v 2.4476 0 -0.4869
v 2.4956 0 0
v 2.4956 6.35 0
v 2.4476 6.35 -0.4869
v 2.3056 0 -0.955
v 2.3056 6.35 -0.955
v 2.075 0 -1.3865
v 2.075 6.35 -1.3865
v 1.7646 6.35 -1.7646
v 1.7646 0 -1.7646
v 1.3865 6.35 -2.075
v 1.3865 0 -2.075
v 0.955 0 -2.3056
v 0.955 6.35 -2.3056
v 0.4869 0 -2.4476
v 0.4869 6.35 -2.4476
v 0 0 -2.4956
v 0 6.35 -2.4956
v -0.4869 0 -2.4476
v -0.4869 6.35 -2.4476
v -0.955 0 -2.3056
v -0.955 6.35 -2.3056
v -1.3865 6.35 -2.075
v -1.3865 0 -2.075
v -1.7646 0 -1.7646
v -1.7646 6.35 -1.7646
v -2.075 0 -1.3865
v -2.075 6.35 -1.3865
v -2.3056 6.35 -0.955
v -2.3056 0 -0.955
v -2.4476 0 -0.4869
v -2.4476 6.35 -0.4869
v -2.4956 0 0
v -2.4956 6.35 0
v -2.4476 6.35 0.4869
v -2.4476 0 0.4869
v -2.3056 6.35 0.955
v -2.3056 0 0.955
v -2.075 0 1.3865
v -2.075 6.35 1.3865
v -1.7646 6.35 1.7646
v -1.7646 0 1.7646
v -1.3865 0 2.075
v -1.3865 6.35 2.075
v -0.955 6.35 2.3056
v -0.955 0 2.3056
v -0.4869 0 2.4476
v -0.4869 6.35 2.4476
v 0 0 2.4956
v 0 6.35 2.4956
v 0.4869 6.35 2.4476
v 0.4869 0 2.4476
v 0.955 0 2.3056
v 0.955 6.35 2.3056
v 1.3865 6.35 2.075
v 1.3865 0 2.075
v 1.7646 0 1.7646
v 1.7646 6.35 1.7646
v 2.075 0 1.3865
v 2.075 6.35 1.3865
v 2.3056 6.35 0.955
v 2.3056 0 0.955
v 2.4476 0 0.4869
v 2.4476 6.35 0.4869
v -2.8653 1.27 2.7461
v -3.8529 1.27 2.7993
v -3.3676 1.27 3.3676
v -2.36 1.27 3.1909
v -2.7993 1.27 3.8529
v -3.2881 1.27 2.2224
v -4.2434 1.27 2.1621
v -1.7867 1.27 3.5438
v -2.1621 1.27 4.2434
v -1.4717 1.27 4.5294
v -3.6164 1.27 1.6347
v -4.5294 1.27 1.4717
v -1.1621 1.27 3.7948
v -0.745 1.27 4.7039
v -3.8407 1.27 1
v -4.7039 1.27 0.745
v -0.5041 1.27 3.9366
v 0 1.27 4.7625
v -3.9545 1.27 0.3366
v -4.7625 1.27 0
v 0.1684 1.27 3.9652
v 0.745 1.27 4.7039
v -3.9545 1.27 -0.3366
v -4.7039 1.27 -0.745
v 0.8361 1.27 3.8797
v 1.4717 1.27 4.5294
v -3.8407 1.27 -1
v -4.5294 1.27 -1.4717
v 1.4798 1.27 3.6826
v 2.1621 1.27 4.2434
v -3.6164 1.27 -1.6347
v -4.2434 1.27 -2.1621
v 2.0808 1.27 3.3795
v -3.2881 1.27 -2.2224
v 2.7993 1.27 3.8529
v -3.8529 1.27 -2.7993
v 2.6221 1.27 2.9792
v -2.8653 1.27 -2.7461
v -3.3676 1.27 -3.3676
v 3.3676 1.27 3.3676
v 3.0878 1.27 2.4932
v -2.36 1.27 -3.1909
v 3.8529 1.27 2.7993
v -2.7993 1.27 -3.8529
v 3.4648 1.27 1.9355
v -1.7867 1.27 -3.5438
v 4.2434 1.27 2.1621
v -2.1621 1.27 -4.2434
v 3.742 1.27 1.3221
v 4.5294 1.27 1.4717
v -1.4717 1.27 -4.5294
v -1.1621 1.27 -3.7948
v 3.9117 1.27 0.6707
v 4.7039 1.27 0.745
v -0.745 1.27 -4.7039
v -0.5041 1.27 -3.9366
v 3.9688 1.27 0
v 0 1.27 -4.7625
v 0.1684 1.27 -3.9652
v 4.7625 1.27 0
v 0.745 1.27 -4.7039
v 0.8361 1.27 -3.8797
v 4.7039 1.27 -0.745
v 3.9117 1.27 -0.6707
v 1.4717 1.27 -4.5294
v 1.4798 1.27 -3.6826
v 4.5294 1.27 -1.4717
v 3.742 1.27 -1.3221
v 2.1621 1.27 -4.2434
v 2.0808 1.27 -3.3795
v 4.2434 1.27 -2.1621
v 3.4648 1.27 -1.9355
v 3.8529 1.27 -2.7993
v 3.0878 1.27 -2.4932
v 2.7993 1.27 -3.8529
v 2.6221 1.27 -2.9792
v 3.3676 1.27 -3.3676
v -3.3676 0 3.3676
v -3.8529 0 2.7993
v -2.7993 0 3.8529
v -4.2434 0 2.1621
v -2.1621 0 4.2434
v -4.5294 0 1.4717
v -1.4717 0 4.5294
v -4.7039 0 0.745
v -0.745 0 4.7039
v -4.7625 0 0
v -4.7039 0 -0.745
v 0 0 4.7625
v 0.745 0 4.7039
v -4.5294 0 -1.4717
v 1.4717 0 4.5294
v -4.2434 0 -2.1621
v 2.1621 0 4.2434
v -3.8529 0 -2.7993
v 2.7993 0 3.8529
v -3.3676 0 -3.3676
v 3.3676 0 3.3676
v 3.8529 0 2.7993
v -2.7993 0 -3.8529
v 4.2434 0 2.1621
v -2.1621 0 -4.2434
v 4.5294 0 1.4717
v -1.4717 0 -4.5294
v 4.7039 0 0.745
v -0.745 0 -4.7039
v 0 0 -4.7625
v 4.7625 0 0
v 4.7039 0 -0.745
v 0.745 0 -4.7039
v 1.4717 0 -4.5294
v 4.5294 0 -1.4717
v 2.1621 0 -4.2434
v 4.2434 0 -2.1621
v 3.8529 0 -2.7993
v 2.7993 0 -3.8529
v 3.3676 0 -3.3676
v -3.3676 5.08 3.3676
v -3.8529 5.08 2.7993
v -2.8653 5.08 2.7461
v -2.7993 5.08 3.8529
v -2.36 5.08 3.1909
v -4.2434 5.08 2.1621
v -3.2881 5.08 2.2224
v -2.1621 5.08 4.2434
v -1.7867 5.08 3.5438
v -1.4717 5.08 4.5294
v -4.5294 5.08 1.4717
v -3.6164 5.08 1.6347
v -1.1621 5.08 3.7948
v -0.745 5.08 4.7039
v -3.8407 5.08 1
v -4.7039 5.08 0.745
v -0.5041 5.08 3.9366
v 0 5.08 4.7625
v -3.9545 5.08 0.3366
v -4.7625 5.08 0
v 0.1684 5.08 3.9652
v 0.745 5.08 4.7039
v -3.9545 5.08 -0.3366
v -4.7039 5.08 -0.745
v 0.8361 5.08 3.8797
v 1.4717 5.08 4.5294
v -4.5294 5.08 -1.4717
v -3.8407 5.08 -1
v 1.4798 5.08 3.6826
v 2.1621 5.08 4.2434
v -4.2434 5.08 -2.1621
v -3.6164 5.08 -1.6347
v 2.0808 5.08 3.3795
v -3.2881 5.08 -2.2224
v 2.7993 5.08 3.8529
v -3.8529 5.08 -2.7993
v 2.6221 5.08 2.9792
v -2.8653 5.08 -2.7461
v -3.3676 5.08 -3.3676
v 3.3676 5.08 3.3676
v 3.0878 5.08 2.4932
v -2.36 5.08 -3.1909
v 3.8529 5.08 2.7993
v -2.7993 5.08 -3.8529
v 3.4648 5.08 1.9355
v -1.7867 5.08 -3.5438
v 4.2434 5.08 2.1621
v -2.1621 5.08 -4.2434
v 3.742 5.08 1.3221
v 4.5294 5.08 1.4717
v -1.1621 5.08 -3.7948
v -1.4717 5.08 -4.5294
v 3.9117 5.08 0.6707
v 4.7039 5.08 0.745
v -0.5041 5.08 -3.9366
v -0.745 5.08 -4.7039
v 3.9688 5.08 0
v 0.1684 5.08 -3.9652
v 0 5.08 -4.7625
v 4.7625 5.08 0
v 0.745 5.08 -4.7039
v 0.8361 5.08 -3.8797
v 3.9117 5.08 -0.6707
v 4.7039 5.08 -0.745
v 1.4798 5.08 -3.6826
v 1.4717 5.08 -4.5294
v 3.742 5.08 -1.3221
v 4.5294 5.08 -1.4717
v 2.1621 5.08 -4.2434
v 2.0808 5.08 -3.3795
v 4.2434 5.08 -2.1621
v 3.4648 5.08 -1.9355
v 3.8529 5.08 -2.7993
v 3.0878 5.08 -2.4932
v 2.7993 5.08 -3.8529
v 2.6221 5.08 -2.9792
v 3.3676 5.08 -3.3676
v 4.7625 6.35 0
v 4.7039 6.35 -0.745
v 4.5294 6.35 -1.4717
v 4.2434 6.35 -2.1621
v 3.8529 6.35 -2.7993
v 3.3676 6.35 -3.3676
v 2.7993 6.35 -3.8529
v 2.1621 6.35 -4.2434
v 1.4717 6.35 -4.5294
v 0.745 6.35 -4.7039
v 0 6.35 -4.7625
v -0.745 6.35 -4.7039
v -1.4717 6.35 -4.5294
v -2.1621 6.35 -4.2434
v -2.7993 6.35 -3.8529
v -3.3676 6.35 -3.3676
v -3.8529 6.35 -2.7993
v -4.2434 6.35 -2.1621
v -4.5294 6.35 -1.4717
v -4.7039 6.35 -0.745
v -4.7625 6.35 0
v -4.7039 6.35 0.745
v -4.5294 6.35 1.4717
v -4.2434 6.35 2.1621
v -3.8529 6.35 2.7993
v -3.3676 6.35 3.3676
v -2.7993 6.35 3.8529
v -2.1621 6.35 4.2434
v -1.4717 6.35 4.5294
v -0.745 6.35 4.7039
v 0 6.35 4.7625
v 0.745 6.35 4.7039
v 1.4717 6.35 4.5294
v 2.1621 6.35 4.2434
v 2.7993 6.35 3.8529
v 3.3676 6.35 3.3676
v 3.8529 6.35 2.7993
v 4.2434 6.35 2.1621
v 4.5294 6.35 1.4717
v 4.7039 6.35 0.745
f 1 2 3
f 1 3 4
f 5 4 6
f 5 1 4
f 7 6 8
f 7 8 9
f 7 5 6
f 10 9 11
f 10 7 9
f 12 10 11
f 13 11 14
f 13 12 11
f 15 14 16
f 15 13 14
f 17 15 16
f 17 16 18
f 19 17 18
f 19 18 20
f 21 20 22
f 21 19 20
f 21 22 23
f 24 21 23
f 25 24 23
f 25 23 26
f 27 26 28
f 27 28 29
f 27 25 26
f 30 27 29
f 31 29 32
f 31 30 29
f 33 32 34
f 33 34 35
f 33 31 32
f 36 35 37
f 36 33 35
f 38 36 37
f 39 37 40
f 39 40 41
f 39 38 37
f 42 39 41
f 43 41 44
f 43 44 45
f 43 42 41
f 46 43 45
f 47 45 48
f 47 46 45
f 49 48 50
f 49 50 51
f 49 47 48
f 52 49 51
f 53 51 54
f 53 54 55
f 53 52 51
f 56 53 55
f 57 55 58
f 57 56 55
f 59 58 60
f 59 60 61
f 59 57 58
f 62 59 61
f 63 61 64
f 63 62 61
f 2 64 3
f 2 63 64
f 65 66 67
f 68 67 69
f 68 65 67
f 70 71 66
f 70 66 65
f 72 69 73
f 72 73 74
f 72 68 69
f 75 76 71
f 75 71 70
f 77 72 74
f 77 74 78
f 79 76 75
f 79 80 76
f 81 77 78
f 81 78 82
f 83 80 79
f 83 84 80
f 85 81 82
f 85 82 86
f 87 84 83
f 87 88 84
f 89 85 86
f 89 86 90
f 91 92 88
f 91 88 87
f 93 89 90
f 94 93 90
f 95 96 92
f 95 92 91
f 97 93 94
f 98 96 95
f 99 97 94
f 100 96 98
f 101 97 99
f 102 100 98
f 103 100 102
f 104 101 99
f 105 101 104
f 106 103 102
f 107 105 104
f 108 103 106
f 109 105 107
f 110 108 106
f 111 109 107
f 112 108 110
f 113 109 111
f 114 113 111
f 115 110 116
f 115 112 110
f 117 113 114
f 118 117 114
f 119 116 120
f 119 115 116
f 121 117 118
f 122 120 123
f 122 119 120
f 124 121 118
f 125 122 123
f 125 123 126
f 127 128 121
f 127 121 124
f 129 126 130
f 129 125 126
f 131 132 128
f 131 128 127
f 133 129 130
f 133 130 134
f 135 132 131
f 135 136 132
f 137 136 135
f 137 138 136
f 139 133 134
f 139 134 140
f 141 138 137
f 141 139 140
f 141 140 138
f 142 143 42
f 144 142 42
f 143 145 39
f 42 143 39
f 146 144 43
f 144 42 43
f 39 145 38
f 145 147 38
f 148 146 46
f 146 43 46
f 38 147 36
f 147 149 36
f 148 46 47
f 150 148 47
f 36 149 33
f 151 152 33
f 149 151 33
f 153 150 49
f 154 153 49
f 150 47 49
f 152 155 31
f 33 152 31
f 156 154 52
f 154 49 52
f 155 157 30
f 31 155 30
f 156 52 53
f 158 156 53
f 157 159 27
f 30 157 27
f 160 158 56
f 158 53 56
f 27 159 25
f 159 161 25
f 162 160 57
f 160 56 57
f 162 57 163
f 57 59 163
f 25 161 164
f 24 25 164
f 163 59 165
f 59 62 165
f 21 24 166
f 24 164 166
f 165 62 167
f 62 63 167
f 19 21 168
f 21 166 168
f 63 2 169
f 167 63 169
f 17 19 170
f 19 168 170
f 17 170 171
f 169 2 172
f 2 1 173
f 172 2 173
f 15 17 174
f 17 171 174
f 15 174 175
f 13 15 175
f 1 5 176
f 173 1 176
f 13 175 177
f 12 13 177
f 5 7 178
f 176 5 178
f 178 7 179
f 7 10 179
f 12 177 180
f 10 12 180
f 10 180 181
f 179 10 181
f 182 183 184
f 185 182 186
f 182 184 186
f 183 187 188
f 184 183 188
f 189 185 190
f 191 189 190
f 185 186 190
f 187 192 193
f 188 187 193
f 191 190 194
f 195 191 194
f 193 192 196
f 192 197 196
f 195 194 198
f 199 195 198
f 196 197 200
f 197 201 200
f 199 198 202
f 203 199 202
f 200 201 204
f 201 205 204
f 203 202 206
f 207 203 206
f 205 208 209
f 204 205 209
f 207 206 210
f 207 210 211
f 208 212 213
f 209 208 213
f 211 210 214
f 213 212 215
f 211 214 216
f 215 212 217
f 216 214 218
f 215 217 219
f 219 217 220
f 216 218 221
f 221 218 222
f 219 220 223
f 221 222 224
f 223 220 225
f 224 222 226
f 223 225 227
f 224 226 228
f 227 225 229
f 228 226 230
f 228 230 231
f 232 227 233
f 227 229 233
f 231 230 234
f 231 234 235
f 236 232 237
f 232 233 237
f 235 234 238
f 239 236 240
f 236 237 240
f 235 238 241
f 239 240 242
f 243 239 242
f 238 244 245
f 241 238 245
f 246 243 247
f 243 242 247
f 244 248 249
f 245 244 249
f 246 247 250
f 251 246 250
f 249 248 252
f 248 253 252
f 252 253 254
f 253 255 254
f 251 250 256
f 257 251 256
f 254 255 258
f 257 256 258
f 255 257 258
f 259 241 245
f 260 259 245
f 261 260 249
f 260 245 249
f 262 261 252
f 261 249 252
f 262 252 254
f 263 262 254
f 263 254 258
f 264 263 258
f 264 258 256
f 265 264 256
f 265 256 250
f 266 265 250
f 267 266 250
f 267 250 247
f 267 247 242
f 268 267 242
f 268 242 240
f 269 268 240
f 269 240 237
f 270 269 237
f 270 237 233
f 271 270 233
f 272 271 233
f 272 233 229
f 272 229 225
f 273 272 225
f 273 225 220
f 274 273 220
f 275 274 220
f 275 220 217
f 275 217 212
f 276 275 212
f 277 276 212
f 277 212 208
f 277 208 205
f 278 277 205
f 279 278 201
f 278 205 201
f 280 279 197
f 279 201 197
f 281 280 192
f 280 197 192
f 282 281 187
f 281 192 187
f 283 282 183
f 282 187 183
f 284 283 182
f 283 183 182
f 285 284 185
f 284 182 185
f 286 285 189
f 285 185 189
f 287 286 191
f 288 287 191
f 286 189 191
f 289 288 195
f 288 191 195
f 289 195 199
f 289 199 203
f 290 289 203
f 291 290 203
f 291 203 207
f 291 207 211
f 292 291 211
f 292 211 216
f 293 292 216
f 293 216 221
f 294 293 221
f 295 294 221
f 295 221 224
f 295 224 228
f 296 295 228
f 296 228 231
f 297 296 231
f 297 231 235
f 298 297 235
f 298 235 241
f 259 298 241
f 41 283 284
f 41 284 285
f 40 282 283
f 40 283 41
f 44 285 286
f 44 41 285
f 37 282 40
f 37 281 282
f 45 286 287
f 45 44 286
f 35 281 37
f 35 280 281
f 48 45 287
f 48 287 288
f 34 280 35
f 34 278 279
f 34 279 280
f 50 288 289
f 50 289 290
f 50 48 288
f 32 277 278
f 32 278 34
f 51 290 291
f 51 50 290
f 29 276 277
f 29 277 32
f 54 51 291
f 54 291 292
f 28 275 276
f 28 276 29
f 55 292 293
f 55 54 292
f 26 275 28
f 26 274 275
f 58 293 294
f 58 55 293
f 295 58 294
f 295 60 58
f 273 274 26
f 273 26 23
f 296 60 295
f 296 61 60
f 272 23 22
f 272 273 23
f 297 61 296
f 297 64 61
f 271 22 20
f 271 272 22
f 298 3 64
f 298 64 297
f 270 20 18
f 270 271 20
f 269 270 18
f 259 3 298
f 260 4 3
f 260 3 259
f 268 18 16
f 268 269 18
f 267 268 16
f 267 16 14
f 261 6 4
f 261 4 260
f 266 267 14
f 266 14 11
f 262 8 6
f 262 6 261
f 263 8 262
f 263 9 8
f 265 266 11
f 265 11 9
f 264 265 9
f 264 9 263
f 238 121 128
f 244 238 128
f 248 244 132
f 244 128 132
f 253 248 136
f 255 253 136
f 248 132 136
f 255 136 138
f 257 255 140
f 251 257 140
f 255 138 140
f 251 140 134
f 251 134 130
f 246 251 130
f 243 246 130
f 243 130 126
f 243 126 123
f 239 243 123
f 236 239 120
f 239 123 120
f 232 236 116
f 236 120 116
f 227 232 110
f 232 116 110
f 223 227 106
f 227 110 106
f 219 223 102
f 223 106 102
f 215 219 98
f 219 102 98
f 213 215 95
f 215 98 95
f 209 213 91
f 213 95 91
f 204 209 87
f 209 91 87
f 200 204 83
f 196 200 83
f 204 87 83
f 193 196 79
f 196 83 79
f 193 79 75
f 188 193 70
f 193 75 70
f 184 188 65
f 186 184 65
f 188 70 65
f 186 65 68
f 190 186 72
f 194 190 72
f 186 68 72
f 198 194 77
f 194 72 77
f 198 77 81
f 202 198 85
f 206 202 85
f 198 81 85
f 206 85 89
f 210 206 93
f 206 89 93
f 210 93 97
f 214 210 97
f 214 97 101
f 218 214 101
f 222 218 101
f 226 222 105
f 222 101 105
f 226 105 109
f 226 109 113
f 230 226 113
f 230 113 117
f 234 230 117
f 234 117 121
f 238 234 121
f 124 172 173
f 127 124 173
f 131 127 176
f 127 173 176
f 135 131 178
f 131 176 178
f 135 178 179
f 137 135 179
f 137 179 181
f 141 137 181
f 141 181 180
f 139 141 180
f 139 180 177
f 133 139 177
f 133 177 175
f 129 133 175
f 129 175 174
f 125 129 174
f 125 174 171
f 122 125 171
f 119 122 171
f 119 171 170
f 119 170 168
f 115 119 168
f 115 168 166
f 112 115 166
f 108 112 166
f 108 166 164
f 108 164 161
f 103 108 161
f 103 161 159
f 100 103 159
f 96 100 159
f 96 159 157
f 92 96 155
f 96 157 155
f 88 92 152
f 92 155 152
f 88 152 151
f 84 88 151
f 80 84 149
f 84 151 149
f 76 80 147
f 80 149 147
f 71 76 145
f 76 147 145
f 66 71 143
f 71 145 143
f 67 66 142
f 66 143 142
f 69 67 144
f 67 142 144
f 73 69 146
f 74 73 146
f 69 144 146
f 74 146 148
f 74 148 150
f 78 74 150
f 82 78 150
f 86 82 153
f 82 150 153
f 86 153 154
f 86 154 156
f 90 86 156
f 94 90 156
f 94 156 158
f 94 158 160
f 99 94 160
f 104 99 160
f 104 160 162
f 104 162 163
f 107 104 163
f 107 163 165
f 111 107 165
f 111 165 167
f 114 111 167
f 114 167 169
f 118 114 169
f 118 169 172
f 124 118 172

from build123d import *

# Parameters (mm, degrees)
SKETCH1_R           = 4.7625
SKETCH1_R_2         = 2.49555
BOSS_EXTRUDE1_DEPTH = 6.35
CUT_EXTRUDE1_START  = -5.08
SKETCH2_R           = 4.7625
SKETCH2_R_2         = 3.96875
CUT_EXTRUDE1_DEPTH  = 3.81


with BuildPart() as part:
    # Sketch1 → Boss-Extrude1 (new body)
    with BuildSketch(Plane(origin=(0, 0, 0), x_dir=(1, 0, 0), z_dir=(0, 1, 0))):
        Circle(SKETCH1_R)
        Circle(SKETCH1_R_2, mode=Mode.SUBTRACT)
    extrude(amount=BOSS_EXTRUDE1_DEPTH)

    # Sketch2 → Cut-Extrude1 (cut)
    with BuildSketch(Plane(origin=(0, 6.35, 0), x_dir=(1, 0, 0), z_dir=(0, 1, 0)).offset(CUT_EXTRUDE1_START)):
        Circle(SKETCH2_R)
        Circle(SKETCH2_R_2, mode=Mode.SUBTRACT)
    extrude(amount=CUT_EXTRUDE1_DEPTH, mode=Mode.SUBTRACT)


solid = part.part
